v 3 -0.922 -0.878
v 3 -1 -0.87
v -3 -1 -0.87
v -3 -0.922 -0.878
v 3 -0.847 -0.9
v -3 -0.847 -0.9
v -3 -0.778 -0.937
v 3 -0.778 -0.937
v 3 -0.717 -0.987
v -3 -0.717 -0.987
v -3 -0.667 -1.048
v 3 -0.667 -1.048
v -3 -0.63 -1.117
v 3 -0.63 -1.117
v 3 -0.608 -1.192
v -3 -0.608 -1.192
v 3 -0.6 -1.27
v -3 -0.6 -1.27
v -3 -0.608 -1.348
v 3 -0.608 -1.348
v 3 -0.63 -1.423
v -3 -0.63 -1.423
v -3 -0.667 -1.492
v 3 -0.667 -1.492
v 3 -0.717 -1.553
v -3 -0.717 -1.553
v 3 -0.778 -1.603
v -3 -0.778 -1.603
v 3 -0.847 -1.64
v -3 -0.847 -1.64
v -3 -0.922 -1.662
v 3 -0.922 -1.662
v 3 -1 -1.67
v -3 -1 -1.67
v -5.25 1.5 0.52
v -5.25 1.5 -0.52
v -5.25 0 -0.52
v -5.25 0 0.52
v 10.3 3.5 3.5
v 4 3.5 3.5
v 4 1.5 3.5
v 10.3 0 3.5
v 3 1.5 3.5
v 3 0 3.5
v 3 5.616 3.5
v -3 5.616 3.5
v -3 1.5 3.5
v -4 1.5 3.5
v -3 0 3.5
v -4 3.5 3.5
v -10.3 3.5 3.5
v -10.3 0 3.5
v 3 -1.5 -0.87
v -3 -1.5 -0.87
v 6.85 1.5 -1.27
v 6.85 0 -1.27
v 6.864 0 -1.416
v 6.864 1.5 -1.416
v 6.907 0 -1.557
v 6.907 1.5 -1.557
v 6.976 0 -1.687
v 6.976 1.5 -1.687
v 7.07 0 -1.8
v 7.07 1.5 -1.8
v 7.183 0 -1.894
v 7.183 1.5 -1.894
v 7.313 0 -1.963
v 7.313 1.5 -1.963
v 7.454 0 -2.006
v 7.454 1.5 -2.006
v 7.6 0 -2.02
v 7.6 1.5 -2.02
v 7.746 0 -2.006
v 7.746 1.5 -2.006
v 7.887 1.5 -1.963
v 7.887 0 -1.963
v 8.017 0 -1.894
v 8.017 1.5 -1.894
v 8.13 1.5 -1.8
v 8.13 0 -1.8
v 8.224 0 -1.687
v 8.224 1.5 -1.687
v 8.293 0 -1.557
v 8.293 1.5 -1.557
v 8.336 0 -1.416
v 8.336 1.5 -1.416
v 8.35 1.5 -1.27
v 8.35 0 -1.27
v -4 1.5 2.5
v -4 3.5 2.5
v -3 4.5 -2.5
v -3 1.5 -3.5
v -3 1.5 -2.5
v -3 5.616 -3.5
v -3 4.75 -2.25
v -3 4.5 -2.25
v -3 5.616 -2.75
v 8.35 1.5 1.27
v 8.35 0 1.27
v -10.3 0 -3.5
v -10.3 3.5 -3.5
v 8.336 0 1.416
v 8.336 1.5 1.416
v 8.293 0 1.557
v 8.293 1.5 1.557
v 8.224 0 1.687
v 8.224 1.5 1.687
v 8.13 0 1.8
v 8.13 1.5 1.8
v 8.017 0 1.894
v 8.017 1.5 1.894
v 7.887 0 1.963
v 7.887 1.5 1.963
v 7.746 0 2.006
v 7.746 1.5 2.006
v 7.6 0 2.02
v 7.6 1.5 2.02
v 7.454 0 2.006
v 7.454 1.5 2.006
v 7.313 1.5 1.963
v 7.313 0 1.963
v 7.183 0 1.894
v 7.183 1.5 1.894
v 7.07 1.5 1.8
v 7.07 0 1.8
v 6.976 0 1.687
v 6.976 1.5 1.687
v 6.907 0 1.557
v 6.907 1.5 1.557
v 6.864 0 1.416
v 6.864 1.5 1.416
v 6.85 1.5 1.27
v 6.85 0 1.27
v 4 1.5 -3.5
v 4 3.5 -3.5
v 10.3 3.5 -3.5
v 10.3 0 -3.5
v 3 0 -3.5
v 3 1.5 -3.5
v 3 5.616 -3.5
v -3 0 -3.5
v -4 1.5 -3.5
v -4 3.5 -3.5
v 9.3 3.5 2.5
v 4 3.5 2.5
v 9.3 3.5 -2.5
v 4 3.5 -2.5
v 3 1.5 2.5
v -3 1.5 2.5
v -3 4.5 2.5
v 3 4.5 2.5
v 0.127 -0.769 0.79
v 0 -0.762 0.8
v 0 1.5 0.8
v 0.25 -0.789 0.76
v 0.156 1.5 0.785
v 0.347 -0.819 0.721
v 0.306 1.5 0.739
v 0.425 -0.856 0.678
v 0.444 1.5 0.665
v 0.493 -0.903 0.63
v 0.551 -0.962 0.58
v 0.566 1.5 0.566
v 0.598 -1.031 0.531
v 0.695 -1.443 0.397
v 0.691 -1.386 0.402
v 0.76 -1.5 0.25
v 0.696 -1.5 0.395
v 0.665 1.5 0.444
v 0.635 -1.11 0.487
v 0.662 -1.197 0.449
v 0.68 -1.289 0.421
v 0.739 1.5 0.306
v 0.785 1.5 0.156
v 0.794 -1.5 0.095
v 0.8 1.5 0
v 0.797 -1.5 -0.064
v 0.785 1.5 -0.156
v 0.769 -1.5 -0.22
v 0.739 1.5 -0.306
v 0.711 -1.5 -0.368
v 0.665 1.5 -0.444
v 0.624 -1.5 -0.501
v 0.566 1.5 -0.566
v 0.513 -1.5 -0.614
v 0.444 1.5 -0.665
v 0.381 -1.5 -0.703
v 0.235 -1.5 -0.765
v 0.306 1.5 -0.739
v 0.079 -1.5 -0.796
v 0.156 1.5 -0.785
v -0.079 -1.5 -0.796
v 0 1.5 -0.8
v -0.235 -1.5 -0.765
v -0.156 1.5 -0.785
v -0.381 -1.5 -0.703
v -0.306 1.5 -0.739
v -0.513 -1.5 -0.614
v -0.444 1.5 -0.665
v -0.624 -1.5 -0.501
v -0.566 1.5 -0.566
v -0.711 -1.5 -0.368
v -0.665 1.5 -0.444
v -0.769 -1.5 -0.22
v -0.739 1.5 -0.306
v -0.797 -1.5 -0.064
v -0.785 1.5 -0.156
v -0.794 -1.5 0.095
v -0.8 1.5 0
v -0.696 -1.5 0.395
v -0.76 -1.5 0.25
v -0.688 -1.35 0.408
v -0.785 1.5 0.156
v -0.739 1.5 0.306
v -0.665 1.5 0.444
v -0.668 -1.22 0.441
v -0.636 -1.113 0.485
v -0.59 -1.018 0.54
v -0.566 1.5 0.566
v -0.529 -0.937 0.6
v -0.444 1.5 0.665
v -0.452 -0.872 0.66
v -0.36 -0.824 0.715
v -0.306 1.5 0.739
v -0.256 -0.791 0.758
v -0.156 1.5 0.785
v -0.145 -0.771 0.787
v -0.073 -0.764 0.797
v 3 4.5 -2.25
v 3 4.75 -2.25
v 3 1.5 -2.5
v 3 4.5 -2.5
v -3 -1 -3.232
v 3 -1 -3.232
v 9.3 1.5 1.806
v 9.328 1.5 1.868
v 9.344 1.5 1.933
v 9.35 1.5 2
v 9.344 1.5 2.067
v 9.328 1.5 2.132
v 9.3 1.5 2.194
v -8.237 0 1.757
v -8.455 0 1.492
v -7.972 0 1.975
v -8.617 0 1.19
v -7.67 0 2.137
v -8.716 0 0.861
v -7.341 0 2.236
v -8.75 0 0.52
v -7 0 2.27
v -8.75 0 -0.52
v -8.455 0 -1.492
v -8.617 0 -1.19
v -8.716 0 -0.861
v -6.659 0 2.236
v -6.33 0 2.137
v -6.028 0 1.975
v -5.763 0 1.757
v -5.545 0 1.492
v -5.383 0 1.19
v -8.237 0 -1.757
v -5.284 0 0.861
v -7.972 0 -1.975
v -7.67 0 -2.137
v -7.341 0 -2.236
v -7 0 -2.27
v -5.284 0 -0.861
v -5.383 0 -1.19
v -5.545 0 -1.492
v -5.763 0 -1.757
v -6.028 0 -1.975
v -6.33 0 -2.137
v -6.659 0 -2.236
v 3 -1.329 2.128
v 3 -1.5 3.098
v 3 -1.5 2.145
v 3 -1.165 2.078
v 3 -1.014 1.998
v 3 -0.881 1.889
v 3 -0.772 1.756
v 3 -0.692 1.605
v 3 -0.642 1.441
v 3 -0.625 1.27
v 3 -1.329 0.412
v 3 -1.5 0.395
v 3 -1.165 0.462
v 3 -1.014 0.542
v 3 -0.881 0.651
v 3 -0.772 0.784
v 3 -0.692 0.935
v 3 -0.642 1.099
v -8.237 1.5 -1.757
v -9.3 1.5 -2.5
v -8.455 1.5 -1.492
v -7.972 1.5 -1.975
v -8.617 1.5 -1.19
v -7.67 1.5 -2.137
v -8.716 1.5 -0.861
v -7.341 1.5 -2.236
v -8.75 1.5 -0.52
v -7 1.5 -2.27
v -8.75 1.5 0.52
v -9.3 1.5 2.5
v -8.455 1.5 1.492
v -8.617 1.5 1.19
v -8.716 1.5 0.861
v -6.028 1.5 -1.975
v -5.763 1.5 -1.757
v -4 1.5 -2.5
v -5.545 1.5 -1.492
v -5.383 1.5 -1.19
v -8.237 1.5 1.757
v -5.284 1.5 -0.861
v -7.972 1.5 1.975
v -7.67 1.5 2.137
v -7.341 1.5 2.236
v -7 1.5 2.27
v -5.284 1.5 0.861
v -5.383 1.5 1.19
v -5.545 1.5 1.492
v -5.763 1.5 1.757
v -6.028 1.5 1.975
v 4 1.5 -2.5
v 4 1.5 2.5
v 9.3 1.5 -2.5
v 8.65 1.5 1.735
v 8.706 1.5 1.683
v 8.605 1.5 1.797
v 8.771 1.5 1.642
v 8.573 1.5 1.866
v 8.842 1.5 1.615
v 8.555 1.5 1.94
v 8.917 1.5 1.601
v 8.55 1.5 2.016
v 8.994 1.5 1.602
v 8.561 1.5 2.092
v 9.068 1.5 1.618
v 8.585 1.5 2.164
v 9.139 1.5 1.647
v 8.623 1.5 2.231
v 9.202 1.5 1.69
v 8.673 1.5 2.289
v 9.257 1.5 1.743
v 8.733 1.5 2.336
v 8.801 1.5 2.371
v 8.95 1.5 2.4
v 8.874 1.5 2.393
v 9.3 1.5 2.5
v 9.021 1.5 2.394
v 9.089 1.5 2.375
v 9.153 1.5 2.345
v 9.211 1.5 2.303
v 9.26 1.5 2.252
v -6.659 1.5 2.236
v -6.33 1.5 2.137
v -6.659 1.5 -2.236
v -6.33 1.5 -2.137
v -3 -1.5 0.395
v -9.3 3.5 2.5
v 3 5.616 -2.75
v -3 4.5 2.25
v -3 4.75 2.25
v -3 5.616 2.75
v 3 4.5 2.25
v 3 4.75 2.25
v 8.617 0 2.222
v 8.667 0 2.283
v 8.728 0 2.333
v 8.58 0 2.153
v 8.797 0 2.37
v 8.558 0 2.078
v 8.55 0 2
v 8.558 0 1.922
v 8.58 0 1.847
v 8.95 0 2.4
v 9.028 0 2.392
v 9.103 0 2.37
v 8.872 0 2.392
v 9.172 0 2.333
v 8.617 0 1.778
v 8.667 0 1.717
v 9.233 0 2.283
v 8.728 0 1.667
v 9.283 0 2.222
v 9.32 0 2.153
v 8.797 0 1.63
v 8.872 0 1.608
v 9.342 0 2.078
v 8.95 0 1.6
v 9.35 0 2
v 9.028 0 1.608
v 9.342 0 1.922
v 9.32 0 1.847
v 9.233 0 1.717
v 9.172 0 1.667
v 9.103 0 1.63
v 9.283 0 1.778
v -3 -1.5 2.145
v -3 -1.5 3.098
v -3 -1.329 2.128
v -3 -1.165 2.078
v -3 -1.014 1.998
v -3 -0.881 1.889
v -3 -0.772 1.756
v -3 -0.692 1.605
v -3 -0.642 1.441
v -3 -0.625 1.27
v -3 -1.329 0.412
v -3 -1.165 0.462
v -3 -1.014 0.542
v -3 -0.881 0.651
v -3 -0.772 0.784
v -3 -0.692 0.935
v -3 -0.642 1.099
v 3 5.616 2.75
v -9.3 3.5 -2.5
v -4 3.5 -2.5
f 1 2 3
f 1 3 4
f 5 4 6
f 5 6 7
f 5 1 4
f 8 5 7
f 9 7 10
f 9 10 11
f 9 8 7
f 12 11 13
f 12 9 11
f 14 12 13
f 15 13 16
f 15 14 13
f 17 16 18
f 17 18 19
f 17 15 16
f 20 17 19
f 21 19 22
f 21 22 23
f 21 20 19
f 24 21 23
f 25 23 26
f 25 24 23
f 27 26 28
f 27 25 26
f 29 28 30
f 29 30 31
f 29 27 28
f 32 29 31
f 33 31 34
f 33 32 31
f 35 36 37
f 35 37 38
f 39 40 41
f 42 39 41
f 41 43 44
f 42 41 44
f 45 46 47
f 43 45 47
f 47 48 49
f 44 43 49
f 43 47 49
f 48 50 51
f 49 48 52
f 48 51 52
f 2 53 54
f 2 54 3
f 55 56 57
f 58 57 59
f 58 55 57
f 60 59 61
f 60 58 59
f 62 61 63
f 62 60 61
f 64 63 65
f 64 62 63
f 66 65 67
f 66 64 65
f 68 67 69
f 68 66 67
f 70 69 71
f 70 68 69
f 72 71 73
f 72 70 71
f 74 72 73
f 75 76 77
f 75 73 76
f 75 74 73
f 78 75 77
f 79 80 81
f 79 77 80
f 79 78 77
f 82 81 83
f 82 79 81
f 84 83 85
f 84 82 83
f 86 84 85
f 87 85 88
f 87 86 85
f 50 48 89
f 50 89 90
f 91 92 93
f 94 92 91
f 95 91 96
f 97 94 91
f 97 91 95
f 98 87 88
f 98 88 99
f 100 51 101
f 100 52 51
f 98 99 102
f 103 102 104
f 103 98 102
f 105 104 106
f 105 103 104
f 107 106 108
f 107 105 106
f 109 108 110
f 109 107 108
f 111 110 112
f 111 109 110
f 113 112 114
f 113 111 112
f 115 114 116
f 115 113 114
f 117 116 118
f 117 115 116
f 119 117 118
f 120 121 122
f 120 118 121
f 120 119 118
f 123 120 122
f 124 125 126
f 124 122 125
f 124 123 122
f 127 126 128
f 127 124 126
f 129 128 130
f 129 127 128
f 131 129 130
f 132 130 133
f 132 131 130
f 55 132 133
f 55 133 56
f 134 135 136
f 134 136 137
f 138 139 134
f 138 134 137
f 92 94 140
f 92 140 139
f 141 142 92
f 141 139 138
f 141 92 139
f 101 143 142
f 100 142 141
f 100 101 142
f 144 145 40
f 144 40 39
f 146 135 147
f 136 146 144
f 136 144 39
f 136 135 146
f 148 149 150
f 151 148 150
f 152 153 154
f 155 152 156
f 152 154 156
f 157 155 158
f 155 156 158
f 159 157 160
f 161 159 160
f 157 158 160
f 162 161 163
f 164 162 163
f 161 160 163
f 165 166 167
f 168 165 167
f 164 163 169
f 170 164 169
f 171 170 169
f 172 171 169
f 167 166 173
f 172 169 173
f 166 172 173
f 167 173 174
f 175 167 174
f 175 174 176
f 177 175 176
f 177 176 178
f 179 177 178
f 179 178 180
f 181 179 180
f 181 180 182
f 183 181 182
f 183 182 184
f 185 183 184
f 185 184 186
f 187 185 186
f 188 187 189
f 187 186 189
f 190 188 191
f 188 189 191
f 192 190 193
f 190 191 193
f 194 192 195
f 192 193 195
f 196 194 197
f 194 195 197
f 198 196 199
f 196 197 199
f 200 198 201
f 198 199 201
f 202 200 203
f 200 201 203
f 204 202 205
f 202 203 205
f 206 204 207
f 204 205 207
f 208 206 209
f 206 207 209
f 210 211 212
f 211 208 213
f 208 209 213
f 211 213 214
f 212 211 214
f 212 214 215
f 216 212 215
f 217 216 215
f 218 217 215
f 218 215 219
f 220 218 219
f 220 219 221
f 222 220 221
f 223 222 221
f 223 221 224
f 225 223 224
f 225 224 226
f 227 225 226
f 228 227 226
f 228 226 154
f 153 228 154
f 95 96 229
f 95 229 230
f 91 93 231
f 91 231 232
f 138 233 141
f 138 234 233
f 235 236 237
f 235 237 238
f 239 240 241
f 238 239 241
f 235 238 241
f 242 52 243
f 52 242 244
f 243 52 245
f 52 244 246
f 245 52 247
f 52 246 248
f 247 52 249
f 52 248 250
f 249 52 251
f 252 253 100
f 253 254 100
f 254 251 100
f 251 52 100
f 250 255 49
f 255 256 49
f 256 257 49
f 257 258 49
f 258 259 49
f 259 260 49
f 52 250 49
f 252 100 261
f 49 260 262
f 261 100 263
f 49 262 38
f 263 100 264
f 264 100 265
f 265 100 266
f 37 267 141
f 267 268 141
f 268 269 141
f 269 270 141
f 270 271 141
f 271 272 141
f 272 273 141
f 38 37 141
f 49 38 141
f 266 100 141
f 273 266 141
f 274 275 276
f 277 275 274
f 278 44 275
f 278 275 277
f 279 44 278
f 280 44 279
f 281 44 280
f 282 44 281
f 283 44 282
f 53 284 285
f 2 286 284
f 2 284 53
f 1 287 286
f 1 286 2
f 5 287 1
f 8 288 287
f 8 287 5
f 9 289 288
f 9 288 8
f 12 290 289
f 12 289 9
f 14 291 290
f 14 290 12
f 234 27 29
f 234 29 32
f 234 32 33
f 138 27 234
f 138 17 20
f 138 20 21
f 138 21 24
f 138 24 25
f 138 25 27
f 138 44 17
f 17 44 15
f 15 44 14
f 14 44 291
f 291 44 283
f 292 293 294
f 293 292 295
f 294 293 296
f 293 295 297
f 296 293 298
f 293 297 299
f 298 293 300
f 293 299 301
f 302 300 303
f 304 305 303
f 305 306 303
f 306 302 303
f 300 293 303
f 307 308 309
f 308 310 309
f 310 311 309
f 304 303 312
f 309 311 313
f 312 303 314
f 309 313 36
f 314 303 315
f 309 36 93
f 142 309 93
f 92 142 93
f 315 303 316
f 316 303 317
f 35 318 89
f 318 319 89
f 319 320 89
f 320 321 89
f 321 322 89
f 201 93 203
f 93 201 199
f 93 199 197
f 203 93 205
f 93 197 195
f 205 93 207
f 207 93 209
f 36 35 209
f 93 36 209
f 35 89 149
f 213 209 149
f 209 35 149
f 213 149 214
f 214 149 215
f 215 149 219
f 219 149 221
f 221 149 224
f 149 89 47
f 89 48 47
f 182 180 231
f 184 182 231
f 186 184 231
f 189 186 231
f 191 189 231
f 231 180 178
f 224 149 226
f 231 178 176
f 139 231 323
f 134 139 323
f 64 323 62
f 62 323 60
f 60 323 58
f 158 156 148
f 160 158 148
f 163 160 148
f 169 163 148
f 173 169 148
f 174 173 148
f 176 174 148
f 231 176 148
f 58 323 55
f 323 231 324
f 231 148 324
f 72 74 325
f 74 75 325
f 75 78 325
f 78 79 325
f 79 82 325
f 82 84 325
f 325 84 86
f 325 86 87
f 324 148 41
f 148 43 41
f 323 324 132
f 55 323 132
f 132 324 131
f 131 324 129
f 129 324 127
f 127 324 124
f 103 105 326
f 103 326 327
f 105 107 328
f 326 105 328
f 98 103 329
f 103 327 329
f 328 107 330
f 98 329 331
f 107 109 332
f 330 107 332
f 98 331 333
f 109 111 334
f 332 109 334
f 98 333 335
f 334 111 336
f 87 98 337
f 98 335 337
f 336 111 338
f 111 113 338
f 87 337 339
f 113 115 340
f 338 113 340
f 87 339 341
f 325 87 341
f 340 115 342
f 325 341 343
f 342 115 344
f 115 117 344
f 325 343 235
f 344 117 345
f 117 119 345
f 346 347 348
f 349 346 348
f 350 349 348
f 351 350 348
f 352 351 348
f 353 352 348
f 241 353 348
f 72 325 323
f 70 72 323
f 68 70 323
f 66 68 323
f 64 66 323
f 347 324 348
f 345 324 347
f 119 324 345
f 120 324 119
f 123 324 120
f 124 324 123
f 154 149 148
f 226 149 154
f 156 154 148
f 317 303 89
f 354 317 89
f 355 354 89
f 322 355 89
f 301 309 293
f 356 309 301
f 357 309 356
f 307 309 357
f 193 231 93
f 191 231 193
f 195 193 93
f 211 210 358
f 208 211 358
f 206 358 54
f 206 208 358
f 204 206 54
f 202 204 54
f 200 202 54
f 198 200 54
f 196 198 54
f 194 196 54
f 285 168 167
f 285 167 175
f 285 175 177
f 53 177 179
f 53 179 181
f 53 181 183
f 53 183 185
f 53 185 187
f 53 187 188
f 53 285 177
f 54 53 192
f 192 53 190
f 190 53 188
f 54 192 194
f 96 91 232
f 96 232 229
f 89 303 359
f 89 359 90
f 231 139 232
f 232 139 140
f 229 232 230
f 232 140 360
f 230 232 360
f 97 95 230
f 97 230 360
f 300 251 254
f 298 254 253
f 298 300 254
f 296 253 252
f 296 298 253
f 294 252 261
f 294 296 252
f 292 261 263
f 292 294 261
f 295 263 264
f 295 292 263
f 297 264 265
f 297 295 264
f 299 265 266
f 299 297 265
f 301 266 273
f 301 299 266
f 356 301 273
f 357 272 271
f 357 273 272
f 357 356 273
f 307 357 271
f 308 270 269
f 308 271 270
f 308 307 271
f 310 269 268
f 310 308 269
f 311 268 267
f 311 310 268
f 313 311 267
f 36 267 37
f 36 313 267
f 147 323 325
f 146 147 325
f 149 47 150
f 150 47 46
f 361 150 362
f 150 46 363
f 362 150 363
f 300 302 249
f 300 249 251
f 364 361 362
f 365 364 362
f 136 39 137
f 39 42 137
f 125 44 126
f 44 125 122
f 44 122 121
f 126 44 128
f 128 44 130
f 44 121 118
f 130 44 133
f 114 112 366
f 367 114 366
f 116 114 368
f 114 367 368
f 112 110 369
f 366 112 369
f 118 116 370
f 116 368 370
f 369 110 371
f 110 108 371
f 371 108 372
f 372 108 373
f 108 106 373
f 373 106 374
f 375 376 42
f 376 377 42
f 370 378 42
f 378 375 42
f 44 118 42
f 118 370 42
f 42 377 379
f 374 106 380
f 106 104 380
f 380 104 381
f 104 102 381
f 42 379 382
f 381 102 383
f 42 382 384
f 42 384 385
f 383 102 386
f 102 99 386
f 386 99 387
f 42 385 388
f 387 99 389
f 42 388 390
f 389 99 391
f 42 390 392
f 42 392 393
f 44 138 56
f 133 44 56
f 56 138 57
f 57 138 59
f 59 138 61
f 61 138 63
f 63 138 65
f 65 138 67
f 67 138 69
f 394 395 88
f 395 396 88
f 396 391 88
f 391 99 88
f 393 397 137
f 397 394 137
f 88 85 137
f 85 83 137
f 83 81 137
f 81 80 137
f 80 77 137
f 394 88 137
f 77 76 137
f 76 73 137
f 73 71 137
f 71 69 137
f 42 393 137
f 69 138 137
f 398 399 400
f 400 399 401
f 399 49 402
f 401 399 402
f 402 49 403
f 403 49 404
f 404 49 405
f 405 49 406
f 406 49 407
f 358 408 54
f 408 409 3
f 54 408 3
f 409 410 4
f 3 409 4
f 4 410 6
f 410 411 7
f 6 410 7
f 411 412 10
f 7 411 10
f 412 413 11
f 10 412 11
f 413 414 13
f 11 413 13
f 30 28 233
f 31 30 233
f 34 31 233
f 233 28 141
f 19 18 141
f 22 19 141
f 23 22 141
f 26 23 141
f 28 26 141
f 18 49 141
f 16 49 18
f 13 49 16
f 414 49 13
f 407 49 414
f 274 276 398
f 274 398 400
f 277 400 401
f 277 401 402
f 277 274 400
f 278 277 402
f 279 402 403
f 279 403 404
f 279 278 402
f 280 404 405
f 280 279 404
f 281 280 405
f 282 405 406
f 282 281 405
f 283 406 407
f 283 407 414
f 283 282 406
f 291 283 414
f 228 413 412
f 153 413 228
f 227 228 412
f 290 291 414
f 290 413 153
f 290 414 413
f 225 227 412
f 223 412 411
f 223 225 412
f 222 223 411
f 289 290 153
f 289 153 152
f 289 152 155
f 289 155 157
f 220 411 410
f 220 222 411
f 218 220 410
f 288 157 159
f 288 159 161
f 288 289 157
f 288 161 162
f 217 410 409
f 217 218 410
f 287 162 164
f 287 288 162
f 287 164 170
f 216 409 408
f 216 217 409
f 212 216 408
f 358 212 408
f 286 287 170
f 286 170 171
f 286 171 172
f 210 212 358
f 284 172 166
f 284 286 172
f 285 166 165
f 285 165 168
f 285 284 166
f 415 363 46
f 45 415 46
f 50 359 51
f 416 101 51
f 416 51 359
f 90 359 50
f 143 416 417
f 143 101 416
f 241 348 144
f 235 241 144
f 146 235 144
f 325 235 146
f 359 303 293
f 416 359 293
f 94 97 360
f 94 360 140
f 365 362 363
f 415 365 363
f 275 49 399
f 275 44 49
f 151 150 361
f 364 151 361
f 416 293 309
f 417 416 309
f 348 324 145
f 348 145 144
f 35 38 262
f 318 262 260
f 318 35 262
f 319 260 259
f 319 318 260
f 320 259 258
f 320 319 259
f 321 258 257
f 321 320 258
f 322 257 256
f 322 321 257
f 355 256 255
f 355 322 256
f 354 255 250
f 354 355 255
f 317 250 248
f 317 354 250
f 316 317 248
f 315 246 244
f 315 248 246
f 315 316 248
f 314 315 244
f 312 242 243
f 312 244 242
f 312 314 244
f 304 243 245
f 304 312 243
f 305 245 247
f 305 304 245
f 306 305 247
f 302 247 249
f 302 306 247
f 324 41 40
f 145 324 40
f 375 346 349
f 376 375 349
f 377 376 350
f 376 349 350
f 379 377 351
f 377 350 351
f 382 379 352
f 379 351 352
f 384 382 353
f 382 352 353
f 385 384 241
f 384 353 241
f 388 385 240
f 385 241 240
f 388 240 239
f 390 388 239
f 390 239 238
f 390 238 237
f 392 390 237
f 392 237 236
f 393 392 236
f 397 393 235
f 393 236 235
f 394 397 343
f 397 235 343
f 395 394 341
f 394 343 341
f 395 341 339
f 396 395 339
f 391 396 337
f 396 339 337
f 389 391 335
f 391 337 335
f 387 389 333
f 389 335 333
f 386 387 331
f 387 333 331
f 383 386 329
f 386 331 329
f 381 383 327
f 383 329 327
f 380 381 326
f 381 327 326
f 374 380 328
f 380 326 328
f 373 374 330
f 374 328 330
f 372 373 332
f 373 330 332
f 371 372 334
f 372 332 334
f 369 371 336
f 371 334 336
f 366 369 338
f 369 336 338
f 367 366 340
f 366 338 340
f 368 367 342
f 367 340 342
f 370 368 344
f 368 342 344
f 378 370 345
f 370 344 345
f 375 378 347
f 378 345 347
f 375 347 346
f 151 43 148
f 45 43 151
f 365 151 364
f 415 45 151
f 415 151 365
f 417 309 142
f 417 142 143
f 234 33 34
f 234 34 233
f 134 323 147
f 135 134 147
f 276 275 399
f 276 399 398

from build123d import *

# Parameters (mm, degrees)
SKETCH1_W           = 20.6
SKETCH1_H           = 7
BOSS_EXTRUDE1_DEPTH = 1.5
SKETCH2_W           = 20.6
SKETCH2_H           = 7
SKETCH2_W_2         = 18.6
SKETCH2_H_2         = 5
BOSS_EXTRUDE2_DEPTH = 2
SKETCH3_W           = 1
SKETCH3_H           = 2
CUT_EXTRUDE1_DEPTH  = 13.935996289
BOSS_EXTRUDE3_DEPTH = 6
CUT_EXTRUDE3_DEPTH  = 12.63106466
BOSS_EXTRUDE4_DEPTH = 3
SKETCH5_R           = 0.8
SKETCH5_R_2         = 0.4
CUT_EXTRUDE2_DEPTH  = 12.63106466


with BuildPart() as part:
    # Sketch1 → Boss-Extrude1 (new body)
    with BuildSketch(Plane(origin=(0, 0, 0), x_dir=(1, 0, 0), z_dir=(0, 1, 0))):
        Rectangle(SKETCH1_W, SKETCH1_H)
    extrude(amount=BOSS_EXTRUDE1_DEPTH)

    # Sketch2 → Boss-Extrude2 (add)
    with BuildSketch(Plane(origin=(0, 1.5, 0), x_dir=(1, 0, 0), z_dir=(0, 1, 0))):
        Rectangle(SKETCH2_W, SKETCH2_H)
        Rectangle(SKETCH2_W_2, SKETCH2_H_2, mode=Mode.SUBTRACT)
    extrude(amount=BOSS_EXTRUDE2_DEPTH)

    # Sketch3 → Cut-Extrude1 (cut, through all)
    with BuildSketch(Plane.XY.offset(3.5)):
        with Locations((3.5, 2.5)):
            Rectangle(SKETCH3_W, SKETCH3_H)
        with Locations((-3.5, 2.5)):
            Rectangle(SKETCH3_W, SKETCH3_H)
    extrude(amount=-CUT_EXTRUDE1_DEPTH, mode=Mode.SUBTRACT)

    # Sketch4 → Boss-Extrude3 (add)
    with BuildSketch(Plane.ZY.offset(3)):
        Polygon((-2.5, 4.5), (-2.25, 4.5), (-2.25, 4.75), (-2.75, 5.616025404), (-3.5, 5.616025404), (-3.5, 3.87609405), (-3.5, 3.5), (-2.5, 3.5), align=None)
    boss_extrude3 = extrude(amount=-BOSS_EXTRUDE3_DEPTH)

    # Mirror1: Boss-Extrude3 across plane
    add(boss_extrude3.mirror(Plane.XY))

    # Sketch6 → Cut-Extrude3 (cut, through all)
    with BuildSketch(Plane(origin=(0, 1.5, 0), x_dir=(1, 0, 0), z_dir=(0, 1, 0))):
        with BuildLine():
            Line((8.35, 1.27), (8.35, -1.27))
            ThreePointArc((8.35, -1.27), (7.6, -2.02), (6.85, -1.27))
            Line((6.85, -1.27), (6.85, 1.27))
            ThreePointArc((6.85, 1.27), (7.6, 2.02), (8.35, 1.27))
        make_face()
        with BuildLine():
            Line((-5.25, 0.52), (-5.25, -0.52))
            ThreePointArc((-5.25, -0.52), (-7, -2.27), (-8.75, -0.52))
            Line((-8.75, -0.52), (-8.75, 0.52))
            ThreePointArc((-8.75, 0.52), (-7, 2.27), (-5.25, 0.52))
        make_face()
    extrude(amount=-CUT_EXTRUDE3_DEPTH, mode=Mode.SUBTRACT)

    # Sketch8 → Boss-Extrude4 (add, symmetric)
    with BuildSketch(Plane(origin=(0, 0, 0), x_dir=(0, 0, -1), z_dir=(1, 0, 0))):
        with BuildLine():
            Line((-3.5, 0), (-3.098076211, -1.5))
            Line((-3.098076211, -1.5), (-2.145, -1.5))
            ThreePointArc((-2.145, -1.5), (-1.27, -0.625), (-0.395, -1.5))
            Line((-0.395, -1.5), (0.87, -1.5))
            Line((0.87, -1.5), (0.87, -1))
            ThreePointArc((0.87, -1), (1.27, -0.6), (1.67, -1))
            Line((1.67, -1), (3.232050808, -1))
            Line((3.232050808, -1), (3.5, 0))
            Line((3.5, 0), (-3.5, 0))
        make_face()
    extrude(amount=BOSS_EXTRUDE4_DEPTH, both=True)

    # Sketch5 → Cut-Extrude2 (cut, through all)
    with BuildSketch(Plane(origin=(0, 1.5, 0), x_dir=(1, 0, 0), z_dir=(0, 1, 0))):
        with Locations(Location((0, 0, 0), (0, 0, 270))):
            Circle(SKETCH5_R)
        with Locations(Location((8.95, -2, 0), (0, 0, 270))):
            Circle(SKETCH5_R_2)
    extrude(amount=-CUT_EXTRUDE2_DEPTH, mode=Mode.SUBTRACT)


solid = part.part
